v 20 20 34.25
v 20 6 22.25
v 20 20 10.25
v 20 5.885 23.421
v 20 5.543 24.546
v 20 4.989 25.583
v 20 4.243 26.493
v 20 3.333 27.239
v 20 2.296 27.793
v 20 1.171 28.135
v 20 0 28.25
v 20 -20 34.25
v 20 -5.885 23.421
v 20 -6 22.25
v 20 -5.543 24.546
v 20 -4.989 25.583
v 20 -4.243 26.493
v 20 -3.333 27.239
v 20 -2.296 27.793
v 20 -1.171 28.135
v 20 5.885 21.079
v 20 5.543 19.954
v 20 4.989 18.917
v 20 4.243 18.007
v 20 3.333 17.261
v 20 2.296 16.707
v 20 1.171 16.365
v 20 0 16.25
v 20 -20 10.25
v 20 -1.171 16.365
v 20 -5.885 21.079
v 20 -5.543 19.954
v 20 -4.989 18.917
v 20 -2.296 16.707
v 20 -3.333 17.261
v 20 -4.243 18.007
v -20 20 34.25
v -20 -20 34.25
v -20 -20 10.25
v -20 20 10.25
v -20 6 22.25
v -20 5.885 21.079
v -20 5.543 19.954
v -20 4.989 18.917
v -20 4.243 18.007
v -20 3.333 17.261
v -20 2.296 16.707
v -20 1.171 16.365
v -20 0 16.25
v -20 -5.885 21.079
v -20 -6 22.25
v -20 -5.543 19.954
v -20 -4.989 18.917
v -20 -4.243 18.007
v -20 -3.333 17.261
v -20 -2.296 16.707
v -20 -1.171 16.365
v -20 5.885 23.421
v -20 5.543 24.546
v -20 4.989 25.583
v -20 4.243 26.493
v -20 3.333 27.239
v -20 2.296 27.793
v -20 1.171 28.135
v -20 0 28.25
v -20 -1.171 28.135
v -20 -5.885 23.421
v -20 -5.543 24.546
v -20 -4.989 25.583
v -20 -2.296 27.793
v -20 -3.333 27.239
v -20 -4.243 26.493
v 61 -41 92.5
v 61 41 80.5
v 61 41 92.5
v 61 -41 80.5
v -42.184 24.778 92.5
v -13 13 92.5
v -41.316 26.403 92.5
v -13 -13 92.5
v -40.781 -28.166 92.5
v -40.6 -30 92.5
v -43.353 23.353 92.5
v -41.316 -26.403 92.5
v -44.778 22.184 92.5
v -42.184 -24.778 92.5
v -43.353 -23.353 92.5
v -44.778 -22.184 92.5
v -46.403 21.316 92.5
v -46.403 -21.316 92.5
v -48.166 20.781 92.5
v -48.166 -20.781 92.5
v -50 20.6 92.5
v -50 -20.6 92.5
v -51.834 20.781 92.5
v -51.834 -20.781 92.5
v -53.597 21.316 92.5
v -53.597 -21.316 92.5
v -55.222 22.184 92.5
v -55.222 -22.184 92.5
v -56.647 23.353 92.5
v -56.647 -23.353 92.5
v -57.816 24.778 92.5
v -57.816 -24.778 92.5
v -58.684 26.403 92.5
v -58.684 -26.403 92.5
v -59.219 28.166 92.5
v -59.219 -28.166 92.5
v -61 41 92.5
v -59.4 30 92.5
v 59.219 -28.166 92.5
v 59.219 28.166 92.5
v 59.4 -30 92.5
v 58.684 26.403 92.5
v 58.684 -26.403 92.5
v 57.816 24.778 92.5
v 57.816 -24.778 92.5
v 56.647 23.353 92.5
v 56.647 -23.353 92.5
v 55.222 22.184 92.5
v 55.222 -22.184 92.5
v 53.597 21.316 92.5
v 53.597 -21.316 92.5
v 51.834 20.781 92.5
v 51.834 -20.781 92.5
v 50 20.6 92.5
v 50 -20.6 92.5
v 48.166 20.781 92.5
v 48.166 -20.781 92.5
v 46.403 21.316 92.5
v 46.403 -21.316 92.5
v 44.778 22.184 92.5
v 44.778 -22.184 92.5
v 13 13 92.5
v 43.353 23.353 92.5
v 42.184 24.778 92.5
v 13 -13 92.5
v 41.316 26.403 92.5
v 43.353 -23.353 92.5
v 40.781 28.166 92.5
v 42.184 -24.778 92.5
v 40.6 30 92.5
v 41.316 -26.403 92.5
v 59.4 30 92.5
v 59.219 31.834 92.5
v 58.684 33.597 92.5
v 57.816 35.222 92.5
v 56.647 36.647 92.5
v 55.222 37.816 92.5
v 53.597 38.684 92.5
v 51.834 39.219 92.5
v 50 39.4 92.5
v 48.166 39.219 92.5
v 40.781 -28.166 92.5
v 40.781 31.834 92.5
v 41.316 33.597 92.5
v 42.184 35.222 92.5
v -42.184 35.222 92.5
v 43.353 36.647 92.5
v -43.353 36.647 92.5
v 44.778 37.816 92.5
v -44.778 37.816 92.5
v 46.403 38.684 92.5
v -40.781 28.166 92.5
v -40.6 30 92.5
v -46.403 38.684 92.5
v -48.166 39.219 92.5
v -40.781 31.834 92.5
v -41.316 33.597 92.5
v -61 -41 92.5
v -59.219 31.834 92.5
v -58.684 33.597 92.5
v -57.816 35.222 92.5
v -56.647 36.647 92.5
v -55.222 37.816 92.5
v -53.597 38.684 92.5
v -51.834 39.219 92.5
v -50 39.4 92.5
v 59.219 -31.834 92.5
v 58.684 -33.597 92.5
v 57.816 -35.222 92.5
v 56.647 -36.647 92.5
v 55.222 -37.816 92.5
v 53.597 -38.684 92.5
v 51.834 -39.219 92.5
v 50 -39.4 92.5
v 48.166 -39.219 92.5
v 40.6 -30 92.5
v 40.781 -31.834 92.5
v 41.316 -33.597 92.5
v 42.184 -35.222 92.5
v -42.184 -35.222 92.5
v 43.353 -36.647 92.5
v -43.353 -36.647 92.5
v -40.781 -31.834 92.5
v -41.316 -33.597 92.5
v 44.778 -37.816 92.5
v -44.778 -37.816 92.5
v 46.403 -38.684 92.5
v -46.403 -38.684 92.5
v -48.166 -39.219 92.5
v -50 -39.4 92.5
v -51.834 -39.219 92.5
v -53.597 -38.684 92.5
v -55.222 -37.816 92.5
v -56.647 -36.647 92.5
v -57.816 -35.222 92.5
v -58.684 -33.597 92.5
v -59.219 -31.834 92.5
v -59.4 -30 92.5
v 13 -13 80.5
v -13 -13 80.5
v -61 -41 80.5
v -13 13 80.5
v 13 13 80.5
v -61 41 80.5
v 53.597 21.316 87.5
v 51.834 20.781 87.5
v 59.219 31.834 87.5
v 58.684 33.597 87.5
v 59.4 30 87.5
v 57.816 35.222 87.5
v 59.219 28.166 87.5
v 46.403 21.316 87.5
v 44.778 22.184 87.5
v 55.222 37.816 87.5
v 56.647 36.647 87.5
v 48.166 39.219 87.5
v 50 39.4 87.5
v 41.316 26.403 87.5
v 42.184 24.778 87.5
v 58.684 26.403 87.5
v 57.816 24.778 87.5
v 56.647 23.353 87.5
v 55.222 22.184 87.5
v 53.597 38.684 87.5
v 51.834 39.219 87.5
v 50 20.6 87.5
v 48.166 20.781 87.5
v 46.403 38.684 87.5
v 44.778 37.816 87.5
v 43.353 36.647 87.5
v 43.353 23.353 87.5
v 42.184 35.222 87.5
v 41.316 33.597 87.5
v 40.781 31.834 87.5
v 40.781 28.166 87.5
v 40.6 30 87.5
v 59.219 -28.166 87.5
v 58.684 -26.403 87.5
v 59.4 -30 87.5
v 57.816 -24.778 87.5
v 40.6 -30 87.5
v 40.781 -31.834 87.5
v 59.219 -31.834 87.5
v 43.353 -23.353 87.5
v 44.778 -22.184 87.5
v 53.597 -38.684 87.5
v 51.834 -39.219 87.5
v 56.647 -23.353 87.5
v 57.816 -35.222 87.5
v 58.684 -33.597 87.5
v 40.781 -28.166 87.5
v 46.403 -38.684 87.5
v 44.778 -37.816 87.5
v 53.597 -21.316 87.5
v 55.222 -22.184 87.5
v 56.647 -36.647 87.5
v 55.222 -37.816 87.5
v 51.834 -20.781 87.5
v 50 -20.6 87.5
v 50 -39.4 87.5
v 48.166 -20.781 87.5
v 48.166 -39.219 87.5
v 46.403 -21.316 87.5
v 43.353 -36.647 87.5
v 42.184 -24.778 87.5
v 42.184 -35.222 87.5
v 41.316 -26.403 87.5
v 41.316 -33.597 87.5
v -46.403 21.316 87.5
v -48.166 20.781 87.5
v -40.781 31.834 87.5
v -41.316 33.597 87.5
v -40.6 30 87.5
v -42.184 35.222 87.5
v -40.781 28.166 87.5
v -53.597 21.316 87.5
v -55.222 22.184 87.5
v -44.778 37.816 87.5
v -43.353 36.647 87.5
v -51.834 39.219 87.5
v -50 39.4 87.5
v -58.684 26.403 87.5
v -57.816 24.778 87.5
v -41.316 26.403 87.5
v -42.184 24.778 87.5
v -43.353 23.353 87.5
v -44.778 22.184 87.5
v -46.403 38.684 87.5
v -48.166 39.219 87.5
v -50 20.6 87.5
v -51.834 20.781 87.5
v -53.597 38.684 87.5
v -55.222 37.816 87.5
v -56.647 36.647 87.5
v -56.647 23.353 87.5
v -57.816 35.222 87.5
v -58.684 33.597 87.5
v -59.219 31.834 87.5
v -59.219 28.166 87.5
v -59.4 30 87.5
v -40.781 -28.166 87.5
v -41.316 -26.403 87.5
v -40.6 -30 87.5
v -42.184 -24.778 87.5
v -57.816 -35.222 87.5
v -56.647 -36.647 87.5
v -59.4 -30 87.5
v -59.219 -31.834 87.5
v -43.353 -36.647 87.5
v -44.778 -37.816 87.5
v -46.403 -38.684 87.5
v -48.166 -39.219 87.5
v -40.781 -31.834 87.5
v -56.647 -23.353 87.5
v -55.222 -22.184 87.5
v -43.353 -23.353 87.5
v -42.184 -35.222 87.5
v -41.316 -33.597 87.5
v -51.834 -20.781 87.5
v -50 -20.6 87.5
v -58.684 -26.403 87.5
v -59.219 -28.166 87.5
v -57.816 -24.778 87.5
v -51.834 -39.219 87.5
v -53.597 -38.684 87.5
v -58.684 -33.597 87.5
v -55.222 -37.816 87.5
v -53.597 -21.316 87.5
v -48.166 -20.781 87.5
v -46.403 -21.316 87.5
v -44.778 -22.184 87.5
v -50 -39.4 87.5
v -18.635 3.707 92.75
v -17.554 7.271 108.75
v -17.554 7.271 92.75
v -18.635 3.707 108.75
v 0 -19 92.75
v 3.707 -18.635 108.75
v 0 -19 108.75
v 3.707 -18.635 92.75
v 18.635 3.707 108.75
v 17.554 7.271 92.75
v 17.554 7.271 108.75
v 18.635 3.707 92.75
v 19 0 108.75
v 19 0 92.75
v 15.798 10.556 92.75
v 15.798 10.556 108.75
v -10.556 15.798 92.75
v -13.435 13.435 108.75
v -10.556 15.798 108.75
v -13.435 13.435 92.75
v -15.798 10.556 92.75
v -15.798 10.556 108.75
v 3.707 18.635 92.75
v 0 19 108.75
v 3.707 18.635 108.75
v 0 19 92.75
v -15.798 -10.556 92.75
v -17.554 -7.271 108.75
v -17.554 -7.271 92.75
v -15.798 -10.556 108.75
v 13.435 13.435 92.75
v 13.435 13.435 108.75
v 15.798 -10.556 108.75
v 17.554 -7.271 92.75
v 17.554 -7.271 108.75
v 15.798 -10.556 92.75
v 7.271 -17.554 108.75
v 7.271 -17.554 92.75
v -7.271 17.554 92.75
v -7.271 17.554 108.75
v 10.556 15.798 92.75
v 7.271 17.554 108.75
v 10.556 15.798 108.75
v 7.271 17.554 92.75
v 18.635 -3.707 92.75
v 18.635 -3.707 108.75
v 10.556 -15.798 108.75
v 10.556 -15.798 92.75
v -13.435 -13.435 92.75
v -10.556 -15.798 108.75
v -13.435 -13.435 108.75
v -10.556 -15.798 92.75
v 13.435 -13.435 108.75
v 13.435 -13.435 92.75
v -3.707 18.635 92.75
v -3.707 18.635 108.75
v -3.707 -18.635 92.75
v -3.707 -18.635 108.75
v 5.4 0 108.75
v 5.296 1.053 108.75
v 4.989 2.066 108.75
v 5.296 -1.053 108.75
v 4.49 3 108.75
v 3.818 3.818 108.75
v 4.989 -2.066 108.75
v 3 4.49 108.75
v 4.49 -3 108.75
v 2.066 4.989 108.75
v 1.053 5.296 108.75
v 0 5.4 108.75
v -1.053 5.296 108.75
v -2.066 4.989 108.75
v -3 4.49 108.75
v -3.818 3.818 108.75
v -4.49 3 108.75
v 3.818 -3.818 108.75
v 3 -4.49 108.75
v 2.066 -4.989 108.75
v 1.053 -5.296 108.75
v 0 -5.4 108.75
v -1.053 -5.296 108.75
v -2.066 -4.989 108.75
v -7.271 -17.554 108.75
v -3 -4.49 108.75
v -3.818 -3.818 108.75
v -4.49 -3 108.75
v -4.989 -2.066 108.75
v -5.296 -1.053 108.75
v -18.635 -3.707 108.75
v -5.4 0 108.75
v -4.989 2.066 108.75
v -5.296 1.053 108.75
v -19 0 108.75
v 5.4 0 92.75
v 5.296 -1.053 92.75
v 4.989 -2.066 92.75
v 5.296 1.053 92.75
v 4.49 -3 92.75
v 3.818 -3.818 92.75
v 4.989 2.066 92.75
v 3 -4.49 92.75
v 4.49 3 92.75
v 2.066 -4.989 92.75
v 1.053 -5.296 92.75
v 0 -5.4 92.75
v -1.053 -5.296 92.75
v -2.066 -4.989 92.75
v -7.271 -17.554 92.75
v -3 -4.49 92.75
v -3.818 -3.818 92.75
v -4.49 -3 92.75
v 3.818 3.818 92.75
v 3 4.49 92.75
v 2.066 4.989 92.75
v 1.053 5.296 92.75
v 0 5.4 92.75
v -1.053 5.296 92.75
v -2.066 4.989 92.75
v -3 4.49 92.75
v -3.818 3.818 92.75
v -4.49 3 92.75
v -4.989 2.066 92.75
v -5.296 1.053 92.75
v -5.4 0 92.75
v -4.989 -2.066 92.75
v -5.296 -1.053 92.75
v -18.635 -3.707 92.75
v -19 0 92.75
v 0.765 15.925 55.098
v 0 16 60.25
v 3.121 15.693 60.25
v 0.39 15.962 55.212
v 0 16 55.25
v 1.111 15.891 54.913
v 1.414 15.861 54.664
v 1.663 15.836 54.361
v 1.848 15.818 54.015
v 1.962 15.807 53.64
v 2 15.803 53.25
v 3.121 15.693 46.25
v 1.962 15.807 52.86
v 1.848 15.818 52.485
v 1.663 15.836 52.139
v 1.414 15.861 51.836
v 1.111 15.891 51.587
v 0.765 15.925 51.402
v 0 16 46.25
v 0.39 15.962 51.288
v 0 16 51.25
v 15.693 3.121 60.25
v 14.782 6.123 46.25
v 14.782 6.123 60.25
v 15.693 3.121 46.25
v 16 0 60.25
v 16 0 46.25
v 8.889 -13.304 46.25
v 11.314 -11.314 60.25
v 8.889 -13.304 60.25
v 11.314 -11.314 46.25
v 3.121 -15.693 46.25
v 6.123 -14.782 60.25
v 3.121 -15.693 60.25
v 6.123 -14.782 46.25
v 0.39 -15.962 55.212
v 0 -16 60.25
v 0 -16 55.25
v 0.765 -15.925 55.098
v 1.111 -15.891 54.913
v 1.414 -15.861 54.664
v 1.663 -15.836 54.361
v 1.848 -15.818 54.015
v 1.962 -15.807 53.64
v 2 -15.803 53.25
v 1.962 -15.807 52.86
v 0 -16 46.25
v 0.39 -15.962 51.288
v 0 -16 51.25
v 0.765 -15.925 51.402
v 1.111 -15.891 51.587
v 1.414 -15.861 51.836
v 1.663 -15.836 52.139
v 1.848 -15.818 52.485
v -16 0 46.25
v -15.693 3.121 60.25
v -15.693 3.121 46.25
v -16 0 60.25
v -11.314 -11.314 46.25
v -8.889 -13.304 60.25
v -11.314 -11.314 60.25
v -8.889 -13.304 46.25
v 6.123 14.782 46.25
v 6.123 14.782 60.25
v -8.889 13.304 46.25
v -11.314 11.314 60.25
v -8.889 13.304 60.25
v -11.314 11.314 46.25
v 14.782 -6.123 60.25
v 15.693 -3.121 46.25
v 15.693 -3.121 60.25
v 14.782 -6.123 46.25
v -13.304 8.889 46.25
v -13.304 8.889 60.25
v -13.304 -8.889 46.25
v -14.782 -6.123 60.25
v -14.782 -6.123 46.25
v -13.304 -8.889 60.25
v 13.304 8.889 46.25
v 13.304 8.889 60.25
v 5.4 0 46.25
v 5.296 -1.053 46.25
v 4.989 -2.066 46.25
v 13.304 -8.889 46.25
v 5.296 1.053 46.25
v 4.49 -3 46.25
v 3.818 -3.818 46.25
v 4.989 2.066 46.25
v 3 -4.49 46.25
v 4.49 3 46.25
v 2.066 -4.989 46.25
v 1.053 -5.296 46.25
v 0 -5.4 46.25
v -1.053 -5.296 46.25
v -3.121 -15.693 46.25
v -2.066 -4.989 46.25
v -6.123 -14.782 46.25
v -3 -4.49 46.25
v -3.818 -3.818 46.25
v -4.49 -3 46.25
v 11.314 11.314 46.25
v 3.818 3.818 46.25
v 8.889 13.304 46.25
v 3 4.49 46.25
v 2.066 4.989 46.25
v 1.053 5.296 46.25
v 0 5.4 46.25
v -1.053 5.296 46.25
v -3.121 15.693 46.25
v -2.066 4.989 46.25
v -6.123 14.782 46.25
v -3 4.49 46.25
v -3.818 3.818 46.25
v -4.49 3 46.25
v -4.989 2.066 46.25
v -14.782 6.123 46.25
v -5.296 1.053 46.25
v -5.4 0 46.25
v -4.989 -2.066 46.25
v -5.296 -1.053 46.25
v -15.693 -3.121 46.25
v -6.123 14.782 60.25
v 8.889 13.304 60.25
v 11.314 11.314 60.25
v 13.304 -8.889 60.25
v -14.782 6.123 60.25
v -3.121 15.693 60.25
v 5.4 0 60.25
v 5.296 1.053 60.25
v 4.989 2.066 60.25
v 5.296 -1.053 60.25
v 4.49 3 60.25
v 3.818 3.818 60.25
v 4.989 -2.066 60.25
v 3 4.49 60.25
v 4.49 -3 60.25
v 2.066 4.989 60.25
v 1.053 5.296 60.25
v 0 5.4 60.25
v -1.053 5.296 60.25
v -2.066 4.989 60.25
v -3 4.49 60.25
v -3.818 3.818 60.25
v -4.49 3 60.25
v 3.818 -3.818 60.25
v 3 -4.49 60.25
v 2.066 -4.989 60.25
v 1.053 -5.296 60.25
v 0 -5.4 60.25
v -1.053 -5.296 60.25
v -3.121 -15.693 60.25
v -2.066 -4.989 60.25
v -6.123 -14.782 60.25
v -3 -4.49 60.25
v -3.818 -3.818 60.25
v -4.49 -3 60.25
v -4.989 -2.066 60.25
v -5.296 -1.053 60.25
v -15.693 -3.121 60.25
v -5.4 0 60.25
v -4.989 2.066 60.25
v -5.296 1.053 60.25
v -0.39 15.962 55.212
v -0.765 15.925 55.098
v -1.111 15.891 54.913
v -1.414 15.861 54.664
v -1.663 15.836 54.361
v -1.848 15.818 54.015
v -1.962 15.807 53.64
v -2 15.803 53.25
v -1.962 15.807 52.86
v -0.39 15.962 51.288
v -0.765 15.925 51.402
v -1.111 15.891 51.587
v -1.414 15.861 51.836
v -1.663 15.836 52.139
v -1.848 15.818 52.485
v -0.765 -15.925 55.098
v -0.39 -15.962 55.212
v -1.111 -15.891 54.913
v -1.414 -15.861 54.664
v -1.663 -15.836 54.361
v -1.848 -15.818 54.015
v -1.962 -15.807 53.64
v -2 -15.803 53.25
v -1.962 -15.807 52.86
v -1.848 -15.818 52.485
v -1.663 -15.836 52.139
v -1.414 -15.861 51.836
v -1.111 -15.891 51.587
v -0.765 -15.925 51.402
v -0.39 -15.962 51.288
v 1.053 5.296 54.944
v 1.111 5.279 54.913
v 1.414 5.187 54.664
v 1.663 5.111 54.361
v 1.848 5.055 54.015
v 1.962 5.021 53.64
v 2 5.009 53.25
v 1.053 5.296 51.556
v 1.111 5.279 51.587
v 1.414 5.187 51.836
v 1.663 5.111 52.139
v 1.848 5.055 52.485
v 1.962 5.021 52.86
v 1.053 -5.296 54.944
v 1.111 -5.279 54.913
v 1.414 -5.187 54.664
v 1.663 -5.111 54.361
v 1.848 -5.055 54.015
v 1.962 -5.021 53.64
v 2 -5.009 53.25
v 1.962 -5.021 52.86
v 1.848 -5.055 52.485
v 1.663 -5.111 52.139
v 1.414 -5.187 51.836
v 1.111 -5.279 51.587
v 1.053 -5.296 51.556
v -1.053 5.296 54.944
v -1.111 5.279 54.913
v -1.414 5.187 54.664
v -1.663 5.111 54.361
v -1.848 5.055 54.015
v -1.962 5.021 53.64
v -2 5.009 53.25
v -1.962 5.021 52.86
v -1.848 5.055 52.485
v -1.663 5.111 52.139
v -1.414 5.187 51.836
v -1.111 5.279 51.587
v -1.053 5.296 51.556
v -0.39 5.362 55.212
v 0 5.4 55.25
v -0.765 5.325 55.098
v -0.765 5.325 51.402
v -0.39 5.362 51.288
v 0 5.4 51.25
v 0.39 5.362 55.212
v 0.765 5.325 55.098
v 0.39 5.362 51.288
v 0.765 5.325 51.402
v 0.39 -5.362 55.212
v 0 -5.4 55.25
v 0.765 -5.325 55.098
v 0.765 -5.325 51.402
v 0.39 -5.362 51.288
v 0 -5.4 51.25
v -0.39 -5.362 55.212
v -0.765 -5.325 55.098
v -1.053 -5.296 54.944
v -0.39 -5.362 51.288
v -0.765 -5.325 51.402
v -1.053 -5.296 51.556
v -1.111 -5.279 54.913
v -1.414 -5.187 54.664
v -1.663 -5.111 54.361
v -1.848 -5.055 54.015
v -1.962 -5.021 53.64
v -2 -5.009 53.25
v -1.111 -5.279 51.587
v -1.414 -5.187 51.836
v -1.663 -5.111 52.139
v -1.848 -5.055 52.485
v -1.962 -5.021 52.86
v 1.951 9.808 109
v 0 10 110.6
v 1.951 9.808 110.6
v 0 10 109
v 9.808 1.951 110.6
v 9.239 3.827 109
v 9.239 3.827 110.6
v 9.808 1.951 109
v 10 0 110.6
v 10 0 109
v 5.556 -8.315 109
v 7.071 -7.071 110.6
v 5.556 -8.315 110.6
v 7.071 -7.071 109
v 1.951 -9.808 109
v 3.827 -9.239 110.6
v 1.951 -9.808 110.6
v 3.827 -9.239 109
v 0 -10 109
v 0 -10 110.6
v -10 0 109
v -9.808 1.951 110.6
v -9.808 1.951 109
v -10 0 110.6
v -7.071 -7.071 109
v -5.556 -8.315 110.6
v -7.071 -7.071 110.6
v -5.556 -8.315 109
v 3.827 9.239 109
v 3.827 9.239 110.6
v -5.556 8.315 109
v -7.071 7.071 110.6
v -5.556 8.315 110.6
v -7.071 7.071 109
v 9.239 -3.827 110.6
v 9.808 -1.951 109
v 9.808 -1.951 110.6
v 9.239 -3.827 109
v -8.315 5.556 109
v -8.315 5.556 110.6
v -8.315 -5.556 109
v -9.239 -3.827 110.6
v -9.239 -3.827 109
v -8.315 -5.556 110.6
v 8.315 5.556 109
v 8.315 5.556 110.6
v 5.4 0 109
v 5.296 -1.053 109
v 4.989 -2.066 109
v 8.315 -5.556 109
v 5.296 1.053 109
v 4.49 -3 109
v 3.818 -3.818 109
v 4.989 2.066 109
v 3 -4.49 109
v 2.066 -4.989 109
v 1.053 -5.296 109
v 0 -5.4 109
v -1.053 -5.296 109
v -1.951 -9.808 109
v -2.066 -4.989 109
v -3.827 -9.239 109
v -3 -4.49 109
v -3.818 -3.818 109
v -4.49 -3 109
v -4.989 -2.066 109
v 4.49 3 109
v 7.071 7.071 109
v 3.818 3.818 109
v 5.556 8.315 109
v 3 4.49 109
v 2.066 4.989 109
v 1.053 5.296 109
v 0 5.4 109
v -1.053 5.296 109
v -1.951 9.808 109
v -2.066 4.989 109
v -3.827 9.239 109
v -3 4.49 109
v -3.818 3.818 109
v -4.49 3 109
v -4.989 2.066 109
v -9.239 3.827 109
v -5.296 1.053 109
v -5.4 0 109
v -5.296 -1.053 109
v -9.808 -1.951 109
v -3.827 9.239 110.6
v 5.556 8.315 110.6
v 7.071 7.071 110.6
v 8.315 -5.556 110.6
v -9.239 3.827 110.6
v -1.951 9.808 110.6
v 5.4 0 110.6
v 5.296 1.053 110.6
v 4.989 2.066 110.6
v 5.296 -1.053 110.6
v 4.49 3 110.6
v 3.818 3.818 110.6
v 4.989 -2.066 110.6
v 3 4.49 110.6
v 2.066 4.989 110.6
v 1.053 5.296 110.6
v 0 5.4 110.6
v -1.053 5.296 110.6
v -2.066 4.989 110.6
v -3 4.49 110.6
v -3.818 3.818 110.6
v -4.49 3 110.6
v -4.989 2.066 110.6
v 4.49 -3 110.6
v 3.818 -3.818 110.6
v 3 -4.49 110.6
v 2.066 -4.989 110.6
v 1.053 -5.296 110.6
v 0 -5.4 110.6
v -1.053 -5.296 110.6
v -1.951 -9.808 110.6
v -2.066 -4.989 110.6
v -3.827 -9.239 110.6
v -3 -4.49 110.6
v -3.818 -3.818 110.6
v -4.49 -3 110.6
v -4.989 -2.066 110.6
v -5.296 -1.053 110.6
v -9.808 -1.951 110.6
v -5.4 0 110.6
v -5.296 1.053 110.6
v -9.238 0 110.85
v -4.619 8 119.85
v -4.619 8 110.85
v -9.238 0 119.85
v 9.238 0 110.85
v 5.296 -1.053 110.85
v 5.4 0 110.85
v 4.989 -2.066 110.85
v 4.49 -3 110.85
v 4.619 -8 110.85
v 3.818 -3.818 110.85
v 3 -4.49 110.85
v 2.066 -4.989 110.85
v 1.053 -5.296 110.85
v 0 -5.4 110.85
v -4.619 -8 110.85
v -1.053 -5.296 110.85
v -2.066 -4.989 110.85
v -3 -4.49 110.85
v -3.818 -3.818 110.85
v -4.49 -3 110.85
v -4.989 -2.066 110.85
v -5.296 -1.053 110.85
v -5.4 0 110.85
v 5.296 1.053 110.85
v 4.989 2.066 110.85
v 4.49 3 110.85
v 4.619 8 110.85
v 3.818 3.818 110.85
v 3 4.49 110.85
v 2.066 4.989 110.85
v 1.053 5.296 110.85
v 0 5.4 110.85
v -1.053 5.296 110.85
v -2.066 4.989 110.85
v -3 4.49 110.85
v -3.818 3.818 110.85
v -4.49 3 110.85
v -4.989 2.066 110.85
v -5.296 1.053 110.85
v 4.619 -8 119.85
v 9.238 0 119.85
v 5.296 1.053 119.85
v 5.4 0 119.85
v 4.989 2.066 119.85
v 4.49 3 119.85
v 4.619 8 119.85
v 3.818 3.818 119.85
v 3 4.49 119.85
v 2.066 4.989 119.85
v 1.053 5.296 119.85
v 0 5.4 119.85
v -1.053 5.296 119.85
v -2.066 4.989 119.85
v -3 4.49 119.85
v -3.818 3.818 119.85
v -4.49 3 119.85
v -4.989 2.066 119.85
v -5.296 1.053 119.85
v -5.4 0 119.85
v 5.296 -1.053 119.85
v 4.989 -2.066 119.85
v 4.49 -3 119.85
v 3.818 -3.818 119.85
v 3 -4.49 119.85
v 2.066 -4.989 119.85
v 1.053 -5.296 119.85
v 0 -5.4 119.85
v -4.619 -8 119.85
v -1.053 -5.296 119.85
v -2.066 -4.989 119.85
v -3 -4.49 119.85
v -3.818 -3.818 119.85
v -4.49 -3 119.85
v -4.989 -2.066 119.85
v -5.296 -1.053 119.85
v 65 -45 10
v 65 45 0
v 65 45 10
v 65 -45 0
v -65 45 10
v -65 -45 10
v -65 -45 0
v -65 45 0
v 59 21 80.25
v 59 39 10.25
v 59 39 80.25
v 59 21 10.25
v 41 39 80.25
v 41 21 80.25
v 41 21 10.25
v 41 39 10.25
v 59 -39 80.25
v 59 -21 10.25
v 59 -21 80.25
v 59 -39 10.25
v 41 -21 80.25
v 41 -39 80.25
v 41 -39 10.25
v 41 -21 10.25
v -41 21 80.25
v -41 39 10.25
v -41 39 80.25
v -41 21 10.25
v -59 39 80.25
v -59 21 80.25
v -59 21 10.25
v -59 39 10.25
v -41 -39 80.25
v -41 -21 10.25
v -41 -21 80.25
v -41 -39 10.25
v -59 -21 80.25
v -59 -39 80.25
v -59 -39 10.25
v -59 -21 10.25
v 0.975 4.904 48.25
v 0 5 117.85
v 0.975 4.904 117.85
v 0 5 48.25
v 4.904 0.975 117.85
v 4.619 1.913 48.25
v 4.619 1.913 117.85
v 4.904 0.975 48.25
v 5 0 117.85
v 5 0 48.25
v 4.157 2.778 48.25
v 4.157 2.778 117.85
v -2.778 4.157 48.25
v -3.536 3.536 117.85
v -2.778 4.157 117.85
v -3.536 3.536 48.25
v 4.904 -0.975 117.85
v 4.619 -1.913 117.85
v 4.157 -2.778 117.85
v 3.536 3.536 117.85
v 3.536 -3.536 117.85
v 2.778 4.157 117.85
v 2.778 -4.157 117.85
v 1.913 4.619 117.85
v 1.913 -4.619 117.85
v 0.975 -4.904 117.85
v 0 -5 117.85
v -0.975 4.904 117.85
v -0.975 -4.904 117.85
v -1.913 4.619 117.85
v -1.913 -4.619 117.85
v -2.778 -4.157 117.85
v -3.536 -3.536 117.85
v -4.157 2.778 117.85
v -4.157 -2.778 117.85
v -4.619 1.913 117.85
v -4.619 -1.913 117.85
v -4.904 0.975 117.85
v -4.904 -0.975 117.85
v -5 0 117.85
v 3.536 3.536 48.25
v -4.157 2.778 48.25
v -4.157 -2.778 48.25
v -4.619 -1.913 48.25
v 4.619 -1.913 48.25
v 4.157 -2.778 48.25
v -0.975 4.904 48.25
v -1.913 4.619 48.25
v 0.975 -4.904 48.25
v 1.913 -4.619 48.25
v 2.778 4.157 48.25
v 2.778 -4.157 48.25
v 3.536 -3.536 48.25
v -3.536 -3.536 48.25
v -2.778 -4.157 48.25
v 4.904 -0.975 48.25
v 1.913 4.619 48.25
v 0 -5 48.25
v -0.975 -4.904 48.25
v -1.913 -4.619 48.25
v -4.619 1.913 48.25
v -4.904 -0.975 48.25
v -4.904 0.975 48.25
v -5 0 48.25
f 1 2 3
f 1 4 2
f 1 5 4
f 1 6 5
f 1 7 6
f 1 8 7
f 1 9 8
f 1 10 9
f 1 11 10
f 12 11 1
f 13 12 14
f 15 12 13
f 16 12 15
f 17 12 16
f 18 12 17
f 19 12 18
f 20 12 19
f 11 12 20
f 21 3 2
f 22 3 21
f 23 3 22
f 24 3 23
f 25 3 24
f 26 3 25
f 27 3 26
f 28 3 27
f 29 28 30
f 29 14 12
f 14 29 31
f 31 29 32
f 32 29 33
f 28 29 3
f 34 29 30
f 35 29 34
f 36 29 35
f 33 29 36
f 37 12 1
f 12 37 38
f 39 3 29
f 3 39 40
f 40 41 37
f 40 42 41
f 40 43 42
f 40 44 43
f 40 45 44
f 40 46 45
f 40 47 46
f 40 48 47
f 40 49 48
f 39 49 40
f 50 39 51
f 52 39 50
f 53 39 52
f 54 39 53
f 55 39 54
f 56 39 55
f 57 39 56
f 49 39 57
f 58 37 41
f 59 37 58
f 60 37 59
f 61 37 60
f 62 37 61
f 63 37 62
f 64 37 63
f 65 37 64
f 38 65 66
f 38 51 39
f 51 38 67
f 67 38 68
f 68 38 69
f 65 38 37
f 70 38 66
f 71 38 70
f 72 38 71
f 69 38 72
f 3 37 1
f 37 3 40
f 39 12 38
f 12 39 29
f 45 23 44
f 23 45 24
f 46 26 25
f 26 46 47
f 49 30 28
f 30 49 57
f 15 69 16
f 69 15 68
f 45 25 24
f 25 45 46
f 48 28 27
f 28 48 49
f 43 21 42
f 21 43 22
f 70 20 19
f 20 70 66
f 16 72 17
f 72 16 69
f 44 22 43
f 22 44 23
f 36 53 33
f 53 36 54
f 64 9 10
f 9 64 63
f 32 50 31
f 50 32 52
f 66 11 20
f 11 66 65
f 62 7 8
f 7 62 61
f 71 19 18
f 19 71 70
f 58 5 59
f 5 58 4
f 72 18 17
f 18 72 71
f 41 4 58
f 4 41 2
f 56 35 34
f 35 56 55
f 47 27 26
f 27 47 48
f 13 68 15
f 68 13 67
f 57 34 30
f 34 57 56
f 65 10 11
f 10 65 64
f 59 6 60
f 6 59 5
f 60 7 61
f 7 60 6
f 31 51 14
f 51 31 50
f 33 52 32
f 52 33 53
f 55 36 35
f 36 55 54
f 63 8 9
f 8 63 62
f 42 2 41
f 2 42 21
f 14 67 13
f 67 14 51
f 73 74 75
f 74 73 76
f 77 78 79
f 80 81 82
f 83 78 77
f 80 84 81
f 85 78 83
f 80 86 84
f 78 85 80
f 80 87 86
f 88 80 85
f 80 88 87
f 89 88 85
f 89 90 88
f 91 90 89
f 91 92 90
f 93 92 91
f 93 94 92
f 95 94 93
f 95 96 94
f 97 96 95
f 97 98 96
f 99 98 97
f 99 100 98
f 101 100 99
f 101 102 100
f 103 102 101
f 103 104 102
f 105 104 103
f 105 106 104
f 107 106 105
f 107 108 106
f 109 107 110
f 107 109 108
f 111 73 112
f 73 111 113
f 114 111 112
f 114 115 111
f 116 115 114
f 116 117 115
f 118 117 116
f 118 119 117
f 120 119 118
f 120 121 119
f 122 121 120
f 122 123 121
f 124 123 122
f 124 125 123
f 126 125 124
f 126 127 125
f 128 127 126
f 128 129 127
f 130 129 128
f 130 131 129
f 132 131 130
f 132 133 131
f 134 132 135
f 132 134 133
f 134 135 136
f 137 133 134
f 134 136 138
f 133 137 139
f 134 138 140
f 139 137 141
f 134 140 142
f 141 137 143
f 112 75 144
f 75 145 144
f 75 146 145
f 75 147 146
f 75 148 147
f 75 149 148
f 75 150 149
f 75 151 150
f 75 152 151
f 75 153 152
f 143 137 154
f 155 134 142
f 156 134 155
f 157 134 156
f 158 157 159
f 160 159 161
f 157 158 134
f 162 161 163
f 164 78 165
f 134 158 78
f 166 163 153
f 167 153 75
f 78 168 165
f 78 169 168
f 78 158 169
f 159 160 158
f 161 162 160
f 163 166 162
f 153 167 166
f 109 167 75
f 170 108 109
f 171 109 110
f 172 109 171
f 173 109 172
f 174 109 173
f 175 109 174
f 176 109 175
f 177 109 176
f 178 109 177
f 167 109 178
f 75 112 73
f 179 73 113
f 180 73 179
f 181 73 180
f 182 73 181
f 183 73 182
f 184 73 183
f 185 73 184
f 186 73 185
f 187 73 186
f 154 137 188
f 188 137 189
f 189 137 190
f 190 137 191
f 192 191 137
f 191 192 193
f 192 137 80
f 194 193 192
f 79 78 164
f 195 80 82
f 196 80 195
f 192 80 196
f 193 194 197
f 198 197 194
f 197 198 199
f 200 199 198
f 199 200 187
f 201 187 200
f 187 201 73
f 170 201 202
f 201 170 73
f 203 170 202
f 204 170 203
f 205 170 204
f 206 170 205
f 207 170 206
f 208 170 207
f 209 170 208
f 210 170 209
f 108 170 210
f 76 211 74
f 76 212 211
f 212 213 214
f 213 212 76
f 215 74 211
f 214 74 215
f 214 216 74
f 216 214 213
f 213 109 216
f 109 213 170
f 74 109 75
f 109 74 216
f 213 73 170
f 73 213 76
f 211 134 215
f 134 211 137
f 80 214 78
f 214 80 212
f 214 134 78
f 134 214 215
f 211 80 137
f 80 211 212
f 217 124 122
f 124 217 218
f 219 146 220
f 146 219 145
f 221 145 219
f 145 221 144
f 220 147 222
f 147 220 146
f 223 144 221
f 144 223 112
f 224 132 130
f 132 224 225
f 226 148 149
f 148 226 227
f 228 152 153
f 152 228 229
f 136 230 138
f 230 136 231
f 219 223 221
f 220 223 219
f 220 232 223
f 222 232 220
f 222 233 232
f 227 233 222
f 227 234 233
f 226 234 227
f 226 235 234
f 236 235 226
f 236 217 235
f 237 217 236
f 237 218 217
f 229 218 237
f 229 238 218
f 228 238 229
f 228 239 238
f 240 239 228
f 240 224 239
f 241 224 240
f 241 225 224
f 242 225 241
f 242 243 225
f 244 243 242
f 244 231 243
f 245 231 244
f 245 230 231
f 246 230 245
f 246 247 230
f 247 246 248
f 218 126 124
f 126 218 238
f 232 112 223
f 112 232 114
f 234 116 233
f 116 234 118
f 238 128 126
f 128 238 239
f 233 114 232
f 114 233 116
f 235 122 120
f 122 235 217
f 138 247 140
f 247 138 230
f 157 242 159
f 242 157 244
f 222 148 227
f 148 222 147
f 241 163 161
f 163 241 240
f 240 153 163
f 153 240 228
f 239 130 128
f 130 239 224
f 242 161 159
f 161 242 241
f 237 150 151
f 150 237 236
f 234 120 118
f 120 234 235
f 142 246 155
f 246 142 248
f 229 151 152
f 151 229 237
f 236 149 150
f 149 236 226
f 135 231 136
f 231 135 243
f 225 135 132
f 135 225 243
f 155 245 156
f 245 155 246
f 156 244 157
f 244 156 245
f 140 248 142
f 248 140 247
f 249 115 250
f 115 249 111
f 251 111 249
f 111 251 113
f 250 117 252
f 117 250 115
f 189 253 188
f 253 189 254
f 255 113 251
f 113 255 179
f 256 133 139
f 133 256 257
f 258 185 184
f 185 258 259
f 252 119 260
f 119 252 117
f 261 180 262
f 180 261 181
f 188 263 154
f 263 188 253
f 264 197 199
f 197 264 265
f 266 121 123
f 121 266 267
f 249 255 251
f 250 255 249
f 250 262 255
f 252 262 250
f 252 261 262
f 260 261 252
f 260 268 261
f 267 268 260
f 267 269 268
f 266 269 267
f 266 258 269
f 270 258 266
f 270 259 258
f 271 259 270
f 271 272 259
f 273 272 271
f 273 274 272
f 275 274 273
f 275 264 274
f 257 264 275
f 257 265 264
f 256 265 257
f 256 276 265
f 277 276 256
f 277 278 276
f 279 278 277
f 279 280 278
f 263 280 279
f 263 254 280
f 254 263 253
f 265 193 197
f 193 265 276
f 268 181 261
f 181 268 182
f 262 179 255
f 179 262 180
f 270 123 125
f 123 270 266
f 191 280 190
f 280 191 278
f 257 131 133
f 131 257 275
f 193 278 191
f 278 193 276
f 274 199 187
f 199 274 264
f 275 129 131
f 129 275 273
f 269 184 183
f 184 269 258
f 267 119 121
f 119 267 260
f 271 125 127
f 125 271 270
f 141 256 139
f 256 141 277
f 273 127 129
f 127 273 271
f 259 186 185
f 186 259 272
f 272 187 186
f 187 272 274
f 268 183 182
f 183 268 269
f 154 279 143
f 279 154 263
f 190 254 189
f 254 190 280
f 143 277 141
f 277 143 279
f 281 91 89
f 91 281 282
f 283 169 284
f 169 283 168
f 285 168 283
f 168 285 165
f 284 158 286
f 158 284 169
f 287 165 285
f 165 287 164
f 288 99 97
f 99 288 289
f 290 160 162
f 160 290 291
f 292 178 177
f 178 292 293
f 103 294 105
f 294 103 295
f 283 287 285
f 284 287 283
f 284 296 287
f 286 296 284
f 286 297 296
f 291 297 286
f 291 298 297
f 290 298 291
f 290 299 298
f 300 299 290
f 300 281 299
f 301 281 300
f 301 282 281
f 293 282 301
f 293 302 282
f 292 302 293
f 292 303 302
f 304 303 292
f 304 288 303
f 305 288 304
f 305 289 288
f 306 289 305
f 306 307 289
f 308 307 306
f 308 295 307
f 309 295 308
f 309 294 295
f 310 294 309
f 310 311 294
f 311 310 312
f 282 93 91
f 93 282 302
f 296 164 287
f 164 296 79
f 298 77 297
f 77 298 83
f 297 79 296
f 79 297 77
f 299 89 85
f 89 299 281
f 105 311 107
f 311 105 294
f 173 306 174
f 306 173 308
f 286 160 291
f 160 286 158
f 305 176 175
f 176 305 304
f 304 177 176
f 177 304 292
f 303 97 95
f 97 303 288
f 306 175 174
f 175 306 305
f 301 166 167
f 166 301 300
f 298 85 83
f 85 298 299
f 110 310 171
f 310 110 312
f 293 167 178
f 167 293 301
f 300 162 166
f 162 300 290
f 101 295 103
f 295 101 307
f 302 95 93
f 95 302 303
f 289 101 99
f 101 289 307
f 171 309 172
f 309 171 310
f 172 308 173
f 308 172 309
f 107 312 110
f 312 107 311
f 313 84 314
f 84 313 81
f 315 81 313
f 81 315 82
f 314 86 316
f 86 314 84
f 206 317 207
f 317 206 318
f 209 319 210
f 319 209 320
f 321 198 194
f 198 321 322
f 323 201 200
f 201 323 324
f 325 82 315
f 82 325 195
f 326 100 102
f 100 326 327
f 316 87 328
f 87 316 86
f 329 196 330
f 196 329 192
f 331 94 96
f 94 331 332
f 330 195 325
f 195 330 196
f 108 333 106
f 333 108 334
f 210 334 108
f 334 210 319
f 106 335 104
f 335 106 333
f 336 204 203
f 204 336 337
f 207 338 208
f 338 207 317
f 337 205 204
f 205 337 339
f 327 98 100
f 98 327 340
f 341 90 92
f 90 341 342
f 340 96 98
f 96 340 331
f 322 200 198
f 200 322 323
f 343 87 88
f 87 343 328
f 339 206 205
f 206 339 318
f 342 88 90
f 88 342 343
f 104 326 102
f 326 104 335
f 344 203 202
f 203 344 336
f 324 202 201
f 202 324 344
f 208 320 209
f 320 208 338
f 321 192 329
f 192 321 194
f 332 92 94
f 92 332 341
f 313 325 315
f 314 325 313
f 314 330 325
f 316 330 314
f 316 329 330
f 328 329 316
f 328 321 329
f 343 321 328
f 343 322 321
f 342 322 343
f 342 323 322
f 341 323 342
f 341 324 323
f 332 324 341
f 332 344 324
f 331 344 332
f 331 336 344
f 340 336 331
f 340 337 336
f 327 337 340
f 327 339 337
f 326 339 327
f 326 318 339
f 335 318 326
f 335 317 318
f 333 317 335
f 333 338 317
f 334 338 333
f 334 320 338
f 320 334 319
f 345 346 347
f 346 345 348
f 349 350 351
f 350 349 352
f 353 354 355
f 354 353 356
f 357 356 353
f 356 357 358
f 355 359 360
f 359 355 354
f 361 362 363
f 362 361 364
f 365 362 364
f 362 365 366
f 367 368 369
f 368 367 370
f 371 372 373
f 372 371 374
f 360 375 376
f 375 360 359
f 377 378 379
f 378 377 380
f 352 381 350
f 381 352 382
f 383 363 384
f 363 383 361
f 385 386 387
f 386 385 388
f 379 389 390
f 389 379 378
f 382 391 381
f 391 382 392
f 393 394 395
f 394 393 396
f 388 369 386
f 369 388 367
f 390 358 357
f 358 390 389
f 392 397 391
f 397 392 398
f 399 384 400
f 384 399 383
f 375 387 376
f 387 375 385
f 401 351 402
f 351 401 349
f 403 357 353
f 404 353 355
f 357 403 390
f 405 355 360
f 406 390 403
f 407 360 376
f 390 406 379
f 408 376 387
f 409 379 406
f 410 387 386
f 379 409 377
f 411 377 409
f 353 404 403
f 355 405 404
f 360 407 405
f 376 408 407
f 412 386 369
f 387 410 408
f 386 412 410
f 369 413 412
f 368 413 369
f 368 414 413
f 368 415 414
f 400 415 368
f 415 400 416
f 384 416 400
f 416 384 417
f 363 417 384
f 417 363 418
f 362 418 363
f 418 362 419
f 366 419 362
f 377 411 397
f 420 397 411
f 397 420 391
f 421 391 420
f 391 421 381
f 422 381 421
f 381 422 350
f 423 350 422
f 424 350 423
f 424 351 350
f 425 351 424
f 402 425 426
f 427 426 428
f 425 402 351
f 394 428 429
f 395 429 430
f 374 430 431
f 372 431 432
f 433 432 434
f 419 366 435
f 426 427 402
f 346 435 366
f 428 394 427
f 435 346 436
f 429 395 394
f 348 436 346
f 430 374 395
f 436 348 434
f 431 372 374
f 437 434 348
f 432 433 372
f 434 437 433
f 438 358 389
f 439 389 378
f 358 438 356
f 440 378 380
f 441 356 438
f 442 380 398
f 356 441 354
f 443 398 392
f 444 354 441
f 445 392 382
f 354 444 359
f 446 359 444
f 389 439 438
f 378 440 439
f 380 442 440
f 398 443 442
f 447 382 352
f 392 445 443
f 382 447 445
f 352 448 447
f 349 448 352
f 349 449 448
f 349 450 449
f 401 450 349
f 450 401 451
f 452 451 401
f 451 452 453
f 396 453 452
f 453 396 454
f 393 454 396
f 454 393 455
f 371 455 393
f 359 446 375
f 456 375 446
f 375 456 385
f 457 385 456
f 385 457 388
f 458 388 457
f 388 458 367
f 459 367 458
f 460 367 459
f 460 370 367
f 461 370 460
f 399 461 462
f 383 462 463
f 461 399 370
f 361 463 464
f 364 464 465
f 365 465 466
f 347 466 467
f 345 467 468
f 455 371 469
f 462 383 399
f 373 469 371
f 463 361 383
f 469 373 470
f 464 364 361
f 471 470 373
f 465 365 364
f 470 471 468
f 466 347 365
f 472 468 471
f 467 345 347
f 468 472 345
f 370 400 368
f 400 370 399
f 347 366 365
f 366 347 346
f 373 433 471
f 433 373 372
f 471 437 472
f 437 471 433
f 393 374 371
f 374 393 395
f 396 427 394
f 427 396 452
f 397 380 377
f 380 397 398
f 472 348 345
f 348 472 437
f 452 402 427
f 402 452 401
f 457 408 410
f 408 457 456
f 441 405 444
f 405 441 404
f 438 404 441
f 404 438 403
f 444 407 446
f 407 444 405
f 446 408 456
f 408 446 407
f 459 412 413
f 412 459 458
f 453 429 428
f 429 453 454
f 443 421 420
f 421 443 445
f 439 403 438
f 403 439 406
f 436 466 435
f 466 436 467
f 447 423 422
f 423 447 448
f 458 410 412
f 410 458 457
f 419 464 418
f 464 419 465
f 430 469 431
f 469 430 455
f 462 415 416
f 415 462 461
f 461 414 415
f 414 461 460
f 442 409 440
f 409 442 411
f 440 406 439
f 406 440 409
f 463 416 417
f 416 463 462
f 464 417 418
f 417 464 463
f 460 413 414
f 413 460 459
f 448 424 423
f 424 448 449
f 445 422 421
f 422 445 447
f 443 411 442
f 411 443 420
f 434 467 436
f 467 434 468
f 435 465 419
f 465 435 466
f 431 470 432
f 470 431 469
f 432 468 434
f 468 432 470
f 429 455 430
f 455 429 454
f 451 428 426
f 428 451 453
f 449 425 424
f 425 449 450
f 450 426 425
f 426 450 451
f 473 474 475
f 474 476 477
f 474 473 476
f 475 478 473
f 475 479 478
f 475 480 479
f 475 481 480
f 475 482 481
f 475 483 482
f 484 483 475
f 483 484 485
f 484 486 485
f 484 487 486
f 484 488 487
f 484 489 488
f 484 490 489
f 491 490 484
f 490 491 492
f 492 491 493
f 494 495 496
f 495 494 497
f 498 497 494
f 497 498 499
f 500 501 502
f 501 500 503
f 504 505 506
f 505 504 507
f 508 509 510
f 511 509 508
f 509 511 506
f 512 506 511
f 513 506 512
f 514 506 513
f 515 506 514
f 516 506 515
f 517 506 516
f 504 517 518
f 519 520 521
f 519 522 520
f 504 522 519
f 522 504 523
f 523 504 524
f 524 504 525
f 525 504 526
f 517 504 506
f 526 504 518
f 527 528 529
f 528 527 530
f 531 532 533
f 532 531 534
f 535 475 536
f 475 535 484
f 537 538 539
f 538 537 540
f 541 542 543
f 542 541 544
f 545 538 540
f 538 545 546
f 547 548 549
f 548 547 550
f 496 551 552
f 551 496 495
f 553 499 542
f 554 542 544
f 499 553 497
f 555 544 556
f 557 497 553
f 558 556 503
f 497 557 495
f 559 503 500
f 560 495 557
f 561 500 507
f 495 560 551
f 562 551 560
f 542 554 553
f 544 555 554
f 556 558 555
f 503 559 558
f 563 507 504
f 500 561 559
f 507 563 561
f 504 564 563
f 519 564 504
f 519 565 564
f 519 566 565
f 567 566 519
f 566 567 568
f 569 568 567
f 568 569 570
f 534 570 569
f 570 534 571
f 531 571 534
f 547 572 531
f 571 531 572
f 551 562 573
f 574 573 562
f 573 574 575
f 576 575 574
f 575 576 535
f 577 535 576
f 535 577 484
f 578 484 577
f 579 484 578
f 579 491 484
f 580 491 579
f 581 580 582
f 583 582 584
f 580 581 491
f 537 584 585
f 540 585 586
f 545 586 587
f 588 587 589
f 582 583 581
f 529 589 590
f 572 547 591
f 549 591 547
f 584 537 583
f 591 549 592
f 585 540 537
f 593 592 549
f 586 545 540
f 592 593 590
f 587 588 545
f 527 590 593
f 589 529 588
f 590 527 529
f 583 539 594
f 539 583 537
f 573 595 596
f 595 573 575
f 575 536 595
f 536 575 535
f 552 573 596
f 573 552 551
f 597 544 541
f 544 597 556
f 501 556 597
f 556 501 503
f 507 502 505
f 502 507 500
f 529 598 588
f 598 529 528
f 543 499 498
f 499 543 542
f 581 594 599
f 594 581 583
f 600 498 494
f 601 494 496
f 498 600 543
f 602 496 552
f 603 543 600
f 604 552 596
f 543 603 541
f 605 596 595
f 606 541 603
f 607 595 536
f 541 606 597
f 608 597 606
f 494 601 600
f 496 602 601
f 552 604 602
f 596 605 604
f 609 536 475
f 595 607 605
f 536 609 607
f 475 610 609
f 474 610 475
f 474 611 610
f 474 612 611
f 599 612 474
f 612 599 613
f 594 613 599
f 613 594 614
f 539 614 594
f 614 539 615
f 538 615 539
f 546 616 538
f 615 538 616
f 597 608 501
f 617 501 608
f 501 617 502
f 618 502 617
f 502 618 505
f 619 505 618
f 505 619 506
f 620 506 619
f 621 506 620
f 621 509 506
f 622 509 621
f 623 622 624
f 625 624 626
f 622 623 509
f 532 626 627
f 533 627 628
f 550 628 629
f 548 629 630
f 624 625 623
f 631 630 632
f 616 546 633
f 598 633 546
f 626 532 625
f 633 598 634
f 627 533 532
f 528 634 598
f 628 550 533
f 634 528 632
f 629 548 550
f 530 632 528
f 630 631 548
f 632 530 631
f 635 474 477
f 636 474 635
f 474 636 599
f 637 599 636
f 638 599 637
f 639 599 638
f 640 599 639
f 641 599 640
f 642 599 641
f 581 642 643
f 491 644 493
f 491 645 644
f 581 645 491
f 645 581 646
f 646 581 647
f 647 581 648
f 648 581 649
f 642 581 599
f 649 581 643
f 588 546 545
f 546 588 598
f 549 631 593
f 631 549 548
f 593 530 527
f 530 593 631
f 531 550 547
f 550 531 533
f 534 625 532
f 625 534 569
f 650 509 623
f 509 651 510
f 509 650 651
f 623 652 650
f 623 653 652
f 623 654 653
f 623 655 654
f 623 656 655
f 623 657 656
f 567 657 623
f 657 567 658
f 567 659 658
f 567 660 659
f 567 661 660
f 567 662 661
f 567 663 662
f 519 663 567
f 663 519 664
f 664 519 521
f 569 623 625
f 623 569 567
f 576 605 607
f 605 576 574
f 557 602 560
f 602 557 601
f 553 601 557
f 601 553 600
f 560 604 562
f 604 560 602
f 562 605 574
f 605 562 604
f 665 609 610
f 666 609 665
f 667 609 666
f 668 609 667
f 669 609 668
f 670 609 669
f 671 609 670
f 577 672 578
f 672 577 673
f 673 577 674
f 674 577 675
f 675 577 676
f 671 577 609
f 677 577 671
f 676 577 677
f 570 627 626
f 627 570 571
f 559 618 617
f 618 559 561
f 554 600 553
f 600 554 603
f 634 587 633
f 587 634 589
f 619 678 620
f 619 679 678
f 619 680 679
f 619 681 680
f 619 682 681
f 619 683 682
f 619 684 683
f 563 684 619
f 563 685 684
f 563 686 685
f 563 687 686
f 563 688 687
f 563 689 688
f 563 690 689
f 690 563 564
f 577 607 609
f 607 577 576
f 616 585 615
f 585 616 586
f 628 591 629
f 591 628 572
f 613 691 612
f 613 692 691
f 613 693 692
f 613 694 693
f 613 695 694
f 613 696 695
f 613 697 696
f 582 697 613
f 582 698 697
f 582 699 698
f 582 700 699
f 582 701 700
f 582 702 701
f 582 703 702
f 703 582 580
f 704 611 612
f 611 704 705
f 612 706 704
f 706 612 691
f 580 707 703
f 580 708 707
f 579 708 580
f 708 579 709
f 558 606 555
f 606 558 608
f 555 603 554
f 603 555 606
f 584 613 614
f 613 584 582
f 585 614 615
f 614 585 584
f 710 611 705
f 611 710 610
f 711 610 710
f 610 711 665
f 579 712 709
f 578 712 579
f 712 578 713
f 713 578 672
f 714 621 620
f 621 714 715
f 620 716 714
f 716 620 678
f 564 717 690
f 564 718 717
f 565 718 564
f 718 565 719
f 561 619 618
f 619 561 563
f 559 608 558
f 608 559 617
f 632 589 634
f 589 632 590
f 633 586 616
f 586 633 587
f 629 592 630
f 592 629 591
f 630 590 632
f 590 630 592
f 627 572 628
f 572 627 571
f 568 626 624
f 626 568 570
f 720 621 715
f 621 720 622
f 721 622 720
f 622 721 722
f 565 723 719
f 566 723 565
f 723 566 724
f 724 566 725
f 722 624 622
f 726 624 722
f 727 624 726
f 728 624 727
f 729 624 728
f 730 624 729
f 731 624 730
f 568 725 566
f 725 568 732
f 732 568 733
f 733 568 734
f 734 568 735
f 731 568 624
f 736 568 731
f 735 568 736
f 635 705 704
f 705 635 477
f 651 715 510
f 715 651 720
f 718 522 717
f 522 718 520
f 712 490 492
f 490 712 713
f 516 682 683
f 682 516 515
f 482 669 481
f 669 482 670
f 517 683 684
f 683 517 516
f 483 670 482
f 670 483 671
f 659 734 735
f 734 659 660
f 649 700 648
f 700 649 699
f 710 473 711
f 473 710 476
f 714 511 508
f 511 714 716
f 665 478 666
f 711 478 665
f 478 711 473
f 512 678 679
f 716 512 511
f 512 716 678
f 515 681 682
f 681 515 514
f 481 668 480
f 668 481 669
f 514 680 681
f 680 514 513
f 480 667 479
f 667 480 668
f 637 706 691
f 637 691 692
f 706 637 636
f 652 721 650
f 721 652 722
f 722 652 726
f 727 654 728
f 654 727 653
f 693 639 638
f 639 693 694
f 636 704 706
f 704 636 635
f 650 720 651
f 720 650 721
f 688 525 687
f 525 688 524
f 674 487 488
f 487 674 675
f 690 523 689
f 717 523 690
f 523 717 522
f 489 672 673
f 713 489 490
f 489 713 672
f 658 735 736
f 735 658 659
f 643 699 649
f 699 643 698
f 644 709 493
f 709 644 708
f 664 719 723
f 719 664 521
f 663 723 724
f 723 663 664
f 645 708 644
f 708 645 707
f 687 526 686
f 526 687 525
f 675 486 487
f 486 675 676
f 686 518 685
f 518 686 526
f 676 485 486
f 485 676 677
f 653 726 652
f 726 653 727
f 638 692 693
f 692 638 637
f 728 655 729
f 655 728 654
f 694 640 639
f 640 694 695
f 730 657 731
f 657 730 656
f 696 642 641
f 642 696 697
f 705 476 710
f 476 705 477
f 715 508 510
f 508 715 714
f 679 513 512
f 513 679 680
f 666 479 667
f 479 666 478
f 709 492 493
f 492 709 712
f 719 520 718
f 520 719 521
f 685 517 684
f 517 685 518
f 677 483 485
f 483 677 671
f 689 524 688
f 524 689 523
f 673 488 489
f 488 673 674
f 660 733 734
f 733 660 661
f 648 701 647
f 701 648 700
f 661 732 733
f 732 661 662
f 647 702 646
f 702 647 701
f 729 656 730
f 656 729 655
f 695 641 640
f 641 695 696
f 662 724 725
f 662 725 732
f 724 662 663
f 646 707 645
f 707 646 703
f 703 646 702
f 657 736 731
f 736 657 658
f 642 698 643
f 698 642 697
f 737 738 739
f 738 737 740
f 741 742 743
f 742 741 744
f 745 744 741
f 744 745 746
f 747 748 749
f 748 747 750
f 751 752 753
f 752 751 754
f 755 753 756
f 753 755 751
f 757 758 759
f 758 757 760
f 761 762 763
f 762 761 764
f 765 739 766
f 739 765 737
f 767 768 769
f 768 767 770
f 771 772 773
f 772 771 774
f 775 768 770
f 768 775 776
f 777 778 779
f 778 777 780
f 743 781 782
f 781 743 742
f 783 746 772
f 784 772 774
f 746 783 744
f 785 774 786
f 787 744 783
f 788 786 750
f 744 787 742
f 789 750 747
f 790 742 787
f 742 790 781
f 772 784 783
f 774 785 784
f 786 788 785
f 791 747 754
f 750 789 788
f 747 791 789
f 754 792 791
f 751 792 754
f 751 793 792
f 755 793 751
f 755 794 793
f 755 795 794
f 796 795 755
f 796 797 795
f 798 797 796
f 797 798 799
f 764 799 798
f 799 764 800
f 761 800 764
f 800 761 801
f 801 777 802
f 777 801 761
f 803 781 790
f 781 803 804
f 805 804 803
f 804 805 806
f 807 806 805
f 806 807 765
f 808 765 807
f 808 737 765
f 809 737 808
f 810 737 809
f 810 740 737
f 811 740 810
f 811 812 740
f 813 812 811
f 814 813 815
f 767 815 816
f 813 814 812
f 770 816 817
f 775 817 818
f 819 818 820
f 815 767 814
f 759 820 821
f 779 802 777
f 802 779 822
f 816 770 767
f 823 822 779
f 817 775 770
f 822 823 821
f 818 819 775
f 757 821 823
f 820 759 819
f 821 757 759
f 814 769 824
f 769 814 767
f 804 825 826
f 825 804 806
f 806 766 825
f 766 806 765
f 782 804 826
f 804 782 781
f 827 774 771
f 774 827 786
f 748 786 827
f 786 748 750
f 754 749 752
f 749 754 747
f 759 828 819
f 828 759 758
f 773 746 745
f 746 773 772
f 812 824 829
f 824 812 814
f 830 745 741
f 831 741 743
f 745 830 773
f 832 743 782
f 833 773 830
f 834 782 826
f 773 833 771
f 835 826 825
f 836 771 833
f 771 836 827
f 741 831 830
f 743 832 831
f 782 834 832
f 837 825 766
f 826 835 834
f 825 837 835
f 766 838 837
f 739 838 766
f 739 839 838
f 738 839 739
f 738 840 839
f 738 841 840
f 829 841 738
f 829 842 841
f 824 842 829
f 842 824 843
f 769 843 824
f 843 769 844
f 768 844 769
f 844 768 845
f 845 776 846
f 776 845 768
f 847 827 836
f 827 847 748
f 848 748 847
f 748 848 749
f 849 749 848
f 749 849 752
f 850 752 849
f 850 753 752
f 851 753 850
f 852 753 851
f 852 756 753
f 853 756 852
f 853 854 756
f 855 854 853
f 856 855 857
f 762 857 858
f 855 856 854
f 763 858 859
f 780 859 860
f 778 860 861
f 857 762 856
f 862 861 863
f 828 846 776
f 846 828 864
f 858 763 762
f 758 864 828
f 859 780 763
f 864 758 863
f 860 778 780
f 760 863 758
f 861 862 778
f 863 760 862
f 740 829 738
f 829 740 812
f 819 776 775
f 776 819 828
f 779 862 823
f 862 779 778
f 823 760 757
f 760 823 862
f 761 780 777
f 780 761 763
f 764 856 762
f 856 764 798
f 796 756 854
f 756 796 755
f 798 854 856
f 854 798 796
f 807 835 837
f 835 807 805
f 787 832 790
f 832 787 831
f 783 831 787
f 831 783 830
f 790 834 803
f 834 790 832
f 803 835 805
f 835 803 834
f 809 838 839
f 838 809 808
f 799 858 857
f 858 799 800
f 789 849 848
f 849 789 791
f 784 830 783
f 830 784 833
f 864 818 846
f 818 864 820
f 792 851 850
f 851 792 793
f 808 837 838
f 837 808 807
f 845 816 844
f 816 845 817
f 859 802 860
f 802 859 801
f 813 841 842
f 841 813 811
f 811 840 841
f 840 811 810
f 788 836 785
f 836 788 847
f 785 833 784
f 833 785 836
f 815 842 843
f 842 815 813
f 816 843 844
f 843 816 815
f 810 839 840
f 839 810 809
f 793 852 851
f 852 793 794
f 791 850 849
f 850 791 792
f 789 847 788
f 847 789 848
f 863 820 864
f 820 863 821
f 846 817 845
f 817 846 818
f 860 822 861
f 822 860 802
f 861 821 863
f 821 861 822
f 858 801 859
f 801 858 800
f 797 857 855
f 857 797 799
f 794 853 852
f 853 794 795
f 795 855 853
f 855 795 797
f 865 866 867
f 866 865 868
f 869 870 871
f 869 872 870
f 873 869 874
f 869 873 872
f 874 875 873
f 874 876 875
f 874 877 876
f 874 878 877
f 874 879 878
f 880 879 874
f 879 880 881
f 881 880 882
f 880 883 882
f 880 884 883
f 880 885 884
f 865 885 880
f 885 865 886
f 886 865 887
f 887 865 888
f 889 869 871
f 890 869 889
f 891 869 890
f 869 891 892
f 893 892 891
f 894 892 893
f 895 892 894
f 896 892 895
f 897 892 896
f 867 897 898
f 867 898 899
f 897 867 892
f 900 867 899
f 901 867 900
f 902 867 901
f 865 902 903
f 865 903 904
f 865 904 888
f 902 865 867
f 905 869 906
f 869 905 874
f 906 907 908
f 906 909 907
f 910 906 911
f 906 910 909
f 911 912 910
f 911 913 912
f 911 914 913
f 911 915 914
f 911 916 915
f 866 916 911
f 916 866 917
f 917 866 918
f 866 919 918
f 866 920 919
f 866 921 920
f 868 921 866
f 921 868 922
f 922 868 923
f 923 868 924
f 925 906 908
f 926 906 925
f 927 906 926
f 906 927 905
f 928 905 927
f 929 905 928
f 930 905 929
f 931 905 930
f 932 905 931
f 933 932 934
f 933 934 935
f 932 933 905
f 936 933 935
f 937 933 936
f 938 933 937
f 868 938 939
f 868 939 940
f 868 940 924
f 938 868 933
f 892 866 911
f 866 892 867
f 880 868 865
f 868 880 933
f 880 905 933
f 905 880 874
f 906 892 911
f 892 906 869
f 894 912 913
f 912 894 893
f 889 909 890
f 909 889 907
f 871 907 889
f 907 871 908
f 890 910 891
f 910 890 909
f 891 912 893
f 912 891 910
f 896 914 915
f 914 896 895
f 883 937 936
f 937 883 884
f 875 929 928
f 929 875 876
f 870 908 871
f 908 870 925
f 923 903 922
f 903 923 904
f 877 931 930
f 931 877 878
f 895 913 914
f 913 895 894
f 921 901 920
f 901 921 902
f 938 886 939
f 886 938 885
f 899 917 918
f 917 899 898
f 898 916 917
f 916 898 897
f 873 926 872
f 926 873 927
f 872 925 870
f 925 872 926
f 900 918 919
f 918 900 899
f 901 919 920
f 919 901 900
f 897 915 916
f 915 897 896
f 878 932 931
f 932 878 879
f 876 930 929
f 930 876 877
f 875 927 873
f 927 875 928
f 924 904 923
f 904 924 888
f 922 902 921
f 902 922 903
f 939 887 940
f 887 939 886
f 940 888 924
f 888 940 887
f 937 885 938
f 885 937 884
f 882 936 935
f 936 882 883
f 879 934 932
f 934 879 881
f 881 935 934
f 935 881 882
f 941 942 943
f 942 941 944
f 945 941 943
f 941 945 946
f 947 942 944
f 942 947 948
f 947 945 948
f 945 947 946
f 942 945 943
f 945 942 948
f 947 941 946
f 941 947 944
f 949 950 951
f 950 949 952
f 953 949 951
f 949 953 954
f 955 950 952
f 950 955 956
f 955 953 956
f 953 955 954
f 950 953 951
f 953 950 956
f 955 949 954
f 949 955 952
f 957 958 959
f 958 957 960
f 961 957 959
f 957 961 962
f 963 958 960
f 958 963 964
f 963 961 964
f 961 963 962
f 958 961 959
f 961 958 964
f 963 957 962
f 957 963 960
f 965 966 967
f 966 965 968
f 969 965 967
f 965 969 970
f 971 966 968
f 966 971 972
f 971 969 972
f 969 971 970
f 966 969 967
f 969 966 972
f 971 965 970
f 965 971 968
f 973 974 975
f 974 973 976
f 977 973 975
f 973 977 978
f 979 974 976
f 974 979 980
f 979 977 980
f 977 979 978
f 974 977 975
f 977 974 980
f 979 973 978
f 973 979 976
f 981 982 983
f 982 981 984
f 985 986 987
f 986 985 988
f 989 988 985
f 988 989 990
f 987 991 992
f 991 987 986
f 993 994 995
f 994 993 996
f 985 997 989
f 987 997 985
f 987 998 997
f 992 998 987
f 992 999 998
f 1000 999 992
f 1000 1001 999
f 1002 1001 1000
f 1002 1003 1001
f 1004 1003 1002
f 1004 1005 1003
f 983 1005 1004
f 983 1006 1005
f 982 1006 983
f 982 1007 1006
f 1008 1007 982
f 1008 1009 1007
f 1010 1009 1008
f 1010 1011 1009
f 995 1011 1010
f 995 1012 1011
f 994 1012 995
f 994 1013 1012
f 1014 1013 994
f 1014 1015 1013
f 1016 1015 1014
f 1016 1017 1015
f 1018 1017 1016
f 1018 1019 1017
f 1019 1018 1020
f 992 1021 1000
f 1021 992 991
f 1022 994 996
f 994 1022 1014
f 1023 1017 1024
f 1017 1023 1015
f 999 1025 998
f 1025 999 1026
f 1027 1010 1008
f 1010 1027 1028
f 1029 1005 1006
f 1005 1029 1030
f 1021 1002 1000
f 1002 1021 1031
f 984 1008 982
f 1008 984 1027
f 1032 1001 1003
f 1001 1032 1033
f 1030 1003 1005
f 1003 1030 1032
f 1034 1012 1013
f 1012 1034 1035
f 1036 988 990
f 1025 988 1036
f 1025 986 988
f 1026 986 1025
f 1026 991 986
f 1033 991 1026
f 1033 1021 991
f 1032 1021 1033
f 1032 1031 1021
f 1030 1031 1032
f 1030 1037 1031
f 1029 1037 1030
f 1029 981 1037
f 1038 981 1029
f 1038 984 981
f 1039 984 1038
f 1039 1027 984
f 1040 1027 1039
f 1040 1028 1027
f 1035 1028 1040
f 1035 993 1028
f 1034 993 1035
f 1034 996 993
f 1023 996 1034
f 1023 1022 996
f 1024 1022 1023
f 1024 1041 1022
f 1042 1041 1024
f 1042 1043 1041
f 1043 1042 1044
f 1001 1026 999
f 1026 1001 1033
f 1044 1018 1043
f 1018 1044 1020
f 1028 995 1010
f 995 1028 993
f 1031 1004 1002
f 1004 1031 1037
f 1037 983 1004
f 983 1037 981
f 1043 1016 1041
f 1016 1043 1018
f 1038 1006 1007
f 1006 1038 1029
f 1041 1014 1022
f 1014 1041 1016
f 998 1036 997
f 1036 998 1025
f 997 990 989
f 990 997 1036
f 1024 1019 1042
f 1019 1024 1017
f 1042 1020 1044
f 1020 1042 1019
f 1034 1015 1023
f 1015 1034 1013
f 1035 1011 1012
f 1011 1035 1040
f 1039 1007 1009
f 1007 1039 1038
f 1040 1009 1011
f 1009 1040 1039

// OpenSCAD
$fn = 32;

// ------------------------------------------------------------------------
// Arbor press fixture: screw d10, posts 70 mm, gap 12 mm
// Every part is its own module, assembly() places every instance.
// ------------------------------------------------------------------------

// --- part 1 ---
module press_bed() {
  difference() {
    translate([-65, -45, 0]) cube([130, 90, 10]);
  }
}

// --- part 2 ---
module anvil_block() {
  difference() {
    translate([-20, -20, 0]) cube([40, 40, 24]);
    translate([0, 0, 12]) rotate([0, 90, 0]) cylinder(h = 42, d = 12, center = true);
  }
}

// --- part 3 ---
module press_post_a() {
  translate([-9, -9, 0]) cube([18, 18, 70]);
}

// --- part 4 ---
module press_post_b() {
  translate([-9, -9, 0]) cube([18, 18, 70]);
}

// --- part 5 ---
module press_post_c() {
  translate([-9, -9, 0]) cube([18, 18, 70]);
}

// --- part 6 ---
module press_post_d() {
  translate([-9, -9, 0]) cube([18, 18, 70]);
}

// --- part 7 ---
module press_frame() {
  difference() {
    translate([-61, -41, 0]) cube([122, 82, 12]);
    translate([-13, -13, -1]) cube([26, 26, 14]);
    translate([50, 30, 7]) cylinder(h = 6, d = 18.8);
    translate([50, -30, 7]) cylinder(h = 6, d = 18.8);
    translate([-50, 30, 7]) cylinder(h = 6, d = 18.8);
    translate([-50, -30, 7]) cylinder(h = 6, d = 18.8);
  }
}

// --- part 8 ---
module guide_ring() {
  difference() {
      translate([0, 0, 0]) cylinder(h = 16, d = 38);
      translate([0, 0, -1]) cylinder(h = 18, d = 10.8);
    }
}

// --- part 9 ---
module press_screw() {
  translate([0, 0, -34.8]) cylinder(h = 69.6, d = 10);
}

// --- part 10 ---
module press_head() {
  difference() {
    cylinder(h = 14, d = 32);
    translate([0, 0, -1]) cylinder(h = 16, d = 10.8);
    translate([0, 0, 7]) rotate([90, 0, 0]) cylinder(h = 34, d = 4, center = true);
  }
}

// --- part 11 ---
module nut_washer() {
  difference() {
      translate([0, 0, 0]) cylinder(h = 1.6, d = 20);
      translate([0, 0, -1]) cylinder(h = 3.6, d = 10.8);
    }
}

// --- part 12 ---
module press_nut() {
  difference() {
    linear_extrude(height = 9) polygon(points = [[9.238, 0], [4.619, 8], [-4.619, 8], [-9.238, 0], [-4.619, -8], [4.619, -8]]);
    translate([0, 0, -1]) cylinder(h = 11, d = 10.8);
  }
}

// --- assembly ---
module assembly() {
  color([0.80, 0.24, 0.20]) translate([0, 0, 0]) rotate([0, 0, 0]) press_bed();
  color([0.20, 0.45, 0.75]) translate([0, 0, 10.25]) rotate([0, 0, 0]) anvil_block();
  color([0.25, 0.62, 0.32]) translate([50, 30, 10.25]) rotate([0, 0, 0]) press_post_a();
  color([0.92, 0.70, 0.18]) translate([50, -30, 10.25]) rotate([0, 0, 0]) press_post_b();
  color([0.58, 0.35, 0.70]) translate([-50, 30, 10.25]) rotate([0, 0, 0]) press_post_c();
  color([0.16, 0.66, 0.66]) translate([-50, -30, 10.25]) rotate([0, 0, 0]) press_post_d();
  color([0.85, 0.48, 0.18]) translate([0, 0, 80.5]) rotate([0, 0, 0]) press_frame();
  color([0.55, 0.60, 0.65]) translate([0, 0, 92.75]) rotate([0, 0, 0]) guide_ring();
  color([0.75, 0.30, 0.55]) translate([0, 0, 83.05]) rotate([0, 0, 0]) press_screw();
  color([0.42, 0.52, 0.28]) translate([0, 0, 46.25]) rotate([0, 0, 0]) press_head();
  color([0.80, 0.24, 0.20]) translate([0, 0, 109]) rotate([0, 0, 0]) nut_washer();
  color([0.20, 0.45, 0.75]) translate([0, 0, 110.85]) rotate([0, 0, 0]) press_nut();
}

assembly();
